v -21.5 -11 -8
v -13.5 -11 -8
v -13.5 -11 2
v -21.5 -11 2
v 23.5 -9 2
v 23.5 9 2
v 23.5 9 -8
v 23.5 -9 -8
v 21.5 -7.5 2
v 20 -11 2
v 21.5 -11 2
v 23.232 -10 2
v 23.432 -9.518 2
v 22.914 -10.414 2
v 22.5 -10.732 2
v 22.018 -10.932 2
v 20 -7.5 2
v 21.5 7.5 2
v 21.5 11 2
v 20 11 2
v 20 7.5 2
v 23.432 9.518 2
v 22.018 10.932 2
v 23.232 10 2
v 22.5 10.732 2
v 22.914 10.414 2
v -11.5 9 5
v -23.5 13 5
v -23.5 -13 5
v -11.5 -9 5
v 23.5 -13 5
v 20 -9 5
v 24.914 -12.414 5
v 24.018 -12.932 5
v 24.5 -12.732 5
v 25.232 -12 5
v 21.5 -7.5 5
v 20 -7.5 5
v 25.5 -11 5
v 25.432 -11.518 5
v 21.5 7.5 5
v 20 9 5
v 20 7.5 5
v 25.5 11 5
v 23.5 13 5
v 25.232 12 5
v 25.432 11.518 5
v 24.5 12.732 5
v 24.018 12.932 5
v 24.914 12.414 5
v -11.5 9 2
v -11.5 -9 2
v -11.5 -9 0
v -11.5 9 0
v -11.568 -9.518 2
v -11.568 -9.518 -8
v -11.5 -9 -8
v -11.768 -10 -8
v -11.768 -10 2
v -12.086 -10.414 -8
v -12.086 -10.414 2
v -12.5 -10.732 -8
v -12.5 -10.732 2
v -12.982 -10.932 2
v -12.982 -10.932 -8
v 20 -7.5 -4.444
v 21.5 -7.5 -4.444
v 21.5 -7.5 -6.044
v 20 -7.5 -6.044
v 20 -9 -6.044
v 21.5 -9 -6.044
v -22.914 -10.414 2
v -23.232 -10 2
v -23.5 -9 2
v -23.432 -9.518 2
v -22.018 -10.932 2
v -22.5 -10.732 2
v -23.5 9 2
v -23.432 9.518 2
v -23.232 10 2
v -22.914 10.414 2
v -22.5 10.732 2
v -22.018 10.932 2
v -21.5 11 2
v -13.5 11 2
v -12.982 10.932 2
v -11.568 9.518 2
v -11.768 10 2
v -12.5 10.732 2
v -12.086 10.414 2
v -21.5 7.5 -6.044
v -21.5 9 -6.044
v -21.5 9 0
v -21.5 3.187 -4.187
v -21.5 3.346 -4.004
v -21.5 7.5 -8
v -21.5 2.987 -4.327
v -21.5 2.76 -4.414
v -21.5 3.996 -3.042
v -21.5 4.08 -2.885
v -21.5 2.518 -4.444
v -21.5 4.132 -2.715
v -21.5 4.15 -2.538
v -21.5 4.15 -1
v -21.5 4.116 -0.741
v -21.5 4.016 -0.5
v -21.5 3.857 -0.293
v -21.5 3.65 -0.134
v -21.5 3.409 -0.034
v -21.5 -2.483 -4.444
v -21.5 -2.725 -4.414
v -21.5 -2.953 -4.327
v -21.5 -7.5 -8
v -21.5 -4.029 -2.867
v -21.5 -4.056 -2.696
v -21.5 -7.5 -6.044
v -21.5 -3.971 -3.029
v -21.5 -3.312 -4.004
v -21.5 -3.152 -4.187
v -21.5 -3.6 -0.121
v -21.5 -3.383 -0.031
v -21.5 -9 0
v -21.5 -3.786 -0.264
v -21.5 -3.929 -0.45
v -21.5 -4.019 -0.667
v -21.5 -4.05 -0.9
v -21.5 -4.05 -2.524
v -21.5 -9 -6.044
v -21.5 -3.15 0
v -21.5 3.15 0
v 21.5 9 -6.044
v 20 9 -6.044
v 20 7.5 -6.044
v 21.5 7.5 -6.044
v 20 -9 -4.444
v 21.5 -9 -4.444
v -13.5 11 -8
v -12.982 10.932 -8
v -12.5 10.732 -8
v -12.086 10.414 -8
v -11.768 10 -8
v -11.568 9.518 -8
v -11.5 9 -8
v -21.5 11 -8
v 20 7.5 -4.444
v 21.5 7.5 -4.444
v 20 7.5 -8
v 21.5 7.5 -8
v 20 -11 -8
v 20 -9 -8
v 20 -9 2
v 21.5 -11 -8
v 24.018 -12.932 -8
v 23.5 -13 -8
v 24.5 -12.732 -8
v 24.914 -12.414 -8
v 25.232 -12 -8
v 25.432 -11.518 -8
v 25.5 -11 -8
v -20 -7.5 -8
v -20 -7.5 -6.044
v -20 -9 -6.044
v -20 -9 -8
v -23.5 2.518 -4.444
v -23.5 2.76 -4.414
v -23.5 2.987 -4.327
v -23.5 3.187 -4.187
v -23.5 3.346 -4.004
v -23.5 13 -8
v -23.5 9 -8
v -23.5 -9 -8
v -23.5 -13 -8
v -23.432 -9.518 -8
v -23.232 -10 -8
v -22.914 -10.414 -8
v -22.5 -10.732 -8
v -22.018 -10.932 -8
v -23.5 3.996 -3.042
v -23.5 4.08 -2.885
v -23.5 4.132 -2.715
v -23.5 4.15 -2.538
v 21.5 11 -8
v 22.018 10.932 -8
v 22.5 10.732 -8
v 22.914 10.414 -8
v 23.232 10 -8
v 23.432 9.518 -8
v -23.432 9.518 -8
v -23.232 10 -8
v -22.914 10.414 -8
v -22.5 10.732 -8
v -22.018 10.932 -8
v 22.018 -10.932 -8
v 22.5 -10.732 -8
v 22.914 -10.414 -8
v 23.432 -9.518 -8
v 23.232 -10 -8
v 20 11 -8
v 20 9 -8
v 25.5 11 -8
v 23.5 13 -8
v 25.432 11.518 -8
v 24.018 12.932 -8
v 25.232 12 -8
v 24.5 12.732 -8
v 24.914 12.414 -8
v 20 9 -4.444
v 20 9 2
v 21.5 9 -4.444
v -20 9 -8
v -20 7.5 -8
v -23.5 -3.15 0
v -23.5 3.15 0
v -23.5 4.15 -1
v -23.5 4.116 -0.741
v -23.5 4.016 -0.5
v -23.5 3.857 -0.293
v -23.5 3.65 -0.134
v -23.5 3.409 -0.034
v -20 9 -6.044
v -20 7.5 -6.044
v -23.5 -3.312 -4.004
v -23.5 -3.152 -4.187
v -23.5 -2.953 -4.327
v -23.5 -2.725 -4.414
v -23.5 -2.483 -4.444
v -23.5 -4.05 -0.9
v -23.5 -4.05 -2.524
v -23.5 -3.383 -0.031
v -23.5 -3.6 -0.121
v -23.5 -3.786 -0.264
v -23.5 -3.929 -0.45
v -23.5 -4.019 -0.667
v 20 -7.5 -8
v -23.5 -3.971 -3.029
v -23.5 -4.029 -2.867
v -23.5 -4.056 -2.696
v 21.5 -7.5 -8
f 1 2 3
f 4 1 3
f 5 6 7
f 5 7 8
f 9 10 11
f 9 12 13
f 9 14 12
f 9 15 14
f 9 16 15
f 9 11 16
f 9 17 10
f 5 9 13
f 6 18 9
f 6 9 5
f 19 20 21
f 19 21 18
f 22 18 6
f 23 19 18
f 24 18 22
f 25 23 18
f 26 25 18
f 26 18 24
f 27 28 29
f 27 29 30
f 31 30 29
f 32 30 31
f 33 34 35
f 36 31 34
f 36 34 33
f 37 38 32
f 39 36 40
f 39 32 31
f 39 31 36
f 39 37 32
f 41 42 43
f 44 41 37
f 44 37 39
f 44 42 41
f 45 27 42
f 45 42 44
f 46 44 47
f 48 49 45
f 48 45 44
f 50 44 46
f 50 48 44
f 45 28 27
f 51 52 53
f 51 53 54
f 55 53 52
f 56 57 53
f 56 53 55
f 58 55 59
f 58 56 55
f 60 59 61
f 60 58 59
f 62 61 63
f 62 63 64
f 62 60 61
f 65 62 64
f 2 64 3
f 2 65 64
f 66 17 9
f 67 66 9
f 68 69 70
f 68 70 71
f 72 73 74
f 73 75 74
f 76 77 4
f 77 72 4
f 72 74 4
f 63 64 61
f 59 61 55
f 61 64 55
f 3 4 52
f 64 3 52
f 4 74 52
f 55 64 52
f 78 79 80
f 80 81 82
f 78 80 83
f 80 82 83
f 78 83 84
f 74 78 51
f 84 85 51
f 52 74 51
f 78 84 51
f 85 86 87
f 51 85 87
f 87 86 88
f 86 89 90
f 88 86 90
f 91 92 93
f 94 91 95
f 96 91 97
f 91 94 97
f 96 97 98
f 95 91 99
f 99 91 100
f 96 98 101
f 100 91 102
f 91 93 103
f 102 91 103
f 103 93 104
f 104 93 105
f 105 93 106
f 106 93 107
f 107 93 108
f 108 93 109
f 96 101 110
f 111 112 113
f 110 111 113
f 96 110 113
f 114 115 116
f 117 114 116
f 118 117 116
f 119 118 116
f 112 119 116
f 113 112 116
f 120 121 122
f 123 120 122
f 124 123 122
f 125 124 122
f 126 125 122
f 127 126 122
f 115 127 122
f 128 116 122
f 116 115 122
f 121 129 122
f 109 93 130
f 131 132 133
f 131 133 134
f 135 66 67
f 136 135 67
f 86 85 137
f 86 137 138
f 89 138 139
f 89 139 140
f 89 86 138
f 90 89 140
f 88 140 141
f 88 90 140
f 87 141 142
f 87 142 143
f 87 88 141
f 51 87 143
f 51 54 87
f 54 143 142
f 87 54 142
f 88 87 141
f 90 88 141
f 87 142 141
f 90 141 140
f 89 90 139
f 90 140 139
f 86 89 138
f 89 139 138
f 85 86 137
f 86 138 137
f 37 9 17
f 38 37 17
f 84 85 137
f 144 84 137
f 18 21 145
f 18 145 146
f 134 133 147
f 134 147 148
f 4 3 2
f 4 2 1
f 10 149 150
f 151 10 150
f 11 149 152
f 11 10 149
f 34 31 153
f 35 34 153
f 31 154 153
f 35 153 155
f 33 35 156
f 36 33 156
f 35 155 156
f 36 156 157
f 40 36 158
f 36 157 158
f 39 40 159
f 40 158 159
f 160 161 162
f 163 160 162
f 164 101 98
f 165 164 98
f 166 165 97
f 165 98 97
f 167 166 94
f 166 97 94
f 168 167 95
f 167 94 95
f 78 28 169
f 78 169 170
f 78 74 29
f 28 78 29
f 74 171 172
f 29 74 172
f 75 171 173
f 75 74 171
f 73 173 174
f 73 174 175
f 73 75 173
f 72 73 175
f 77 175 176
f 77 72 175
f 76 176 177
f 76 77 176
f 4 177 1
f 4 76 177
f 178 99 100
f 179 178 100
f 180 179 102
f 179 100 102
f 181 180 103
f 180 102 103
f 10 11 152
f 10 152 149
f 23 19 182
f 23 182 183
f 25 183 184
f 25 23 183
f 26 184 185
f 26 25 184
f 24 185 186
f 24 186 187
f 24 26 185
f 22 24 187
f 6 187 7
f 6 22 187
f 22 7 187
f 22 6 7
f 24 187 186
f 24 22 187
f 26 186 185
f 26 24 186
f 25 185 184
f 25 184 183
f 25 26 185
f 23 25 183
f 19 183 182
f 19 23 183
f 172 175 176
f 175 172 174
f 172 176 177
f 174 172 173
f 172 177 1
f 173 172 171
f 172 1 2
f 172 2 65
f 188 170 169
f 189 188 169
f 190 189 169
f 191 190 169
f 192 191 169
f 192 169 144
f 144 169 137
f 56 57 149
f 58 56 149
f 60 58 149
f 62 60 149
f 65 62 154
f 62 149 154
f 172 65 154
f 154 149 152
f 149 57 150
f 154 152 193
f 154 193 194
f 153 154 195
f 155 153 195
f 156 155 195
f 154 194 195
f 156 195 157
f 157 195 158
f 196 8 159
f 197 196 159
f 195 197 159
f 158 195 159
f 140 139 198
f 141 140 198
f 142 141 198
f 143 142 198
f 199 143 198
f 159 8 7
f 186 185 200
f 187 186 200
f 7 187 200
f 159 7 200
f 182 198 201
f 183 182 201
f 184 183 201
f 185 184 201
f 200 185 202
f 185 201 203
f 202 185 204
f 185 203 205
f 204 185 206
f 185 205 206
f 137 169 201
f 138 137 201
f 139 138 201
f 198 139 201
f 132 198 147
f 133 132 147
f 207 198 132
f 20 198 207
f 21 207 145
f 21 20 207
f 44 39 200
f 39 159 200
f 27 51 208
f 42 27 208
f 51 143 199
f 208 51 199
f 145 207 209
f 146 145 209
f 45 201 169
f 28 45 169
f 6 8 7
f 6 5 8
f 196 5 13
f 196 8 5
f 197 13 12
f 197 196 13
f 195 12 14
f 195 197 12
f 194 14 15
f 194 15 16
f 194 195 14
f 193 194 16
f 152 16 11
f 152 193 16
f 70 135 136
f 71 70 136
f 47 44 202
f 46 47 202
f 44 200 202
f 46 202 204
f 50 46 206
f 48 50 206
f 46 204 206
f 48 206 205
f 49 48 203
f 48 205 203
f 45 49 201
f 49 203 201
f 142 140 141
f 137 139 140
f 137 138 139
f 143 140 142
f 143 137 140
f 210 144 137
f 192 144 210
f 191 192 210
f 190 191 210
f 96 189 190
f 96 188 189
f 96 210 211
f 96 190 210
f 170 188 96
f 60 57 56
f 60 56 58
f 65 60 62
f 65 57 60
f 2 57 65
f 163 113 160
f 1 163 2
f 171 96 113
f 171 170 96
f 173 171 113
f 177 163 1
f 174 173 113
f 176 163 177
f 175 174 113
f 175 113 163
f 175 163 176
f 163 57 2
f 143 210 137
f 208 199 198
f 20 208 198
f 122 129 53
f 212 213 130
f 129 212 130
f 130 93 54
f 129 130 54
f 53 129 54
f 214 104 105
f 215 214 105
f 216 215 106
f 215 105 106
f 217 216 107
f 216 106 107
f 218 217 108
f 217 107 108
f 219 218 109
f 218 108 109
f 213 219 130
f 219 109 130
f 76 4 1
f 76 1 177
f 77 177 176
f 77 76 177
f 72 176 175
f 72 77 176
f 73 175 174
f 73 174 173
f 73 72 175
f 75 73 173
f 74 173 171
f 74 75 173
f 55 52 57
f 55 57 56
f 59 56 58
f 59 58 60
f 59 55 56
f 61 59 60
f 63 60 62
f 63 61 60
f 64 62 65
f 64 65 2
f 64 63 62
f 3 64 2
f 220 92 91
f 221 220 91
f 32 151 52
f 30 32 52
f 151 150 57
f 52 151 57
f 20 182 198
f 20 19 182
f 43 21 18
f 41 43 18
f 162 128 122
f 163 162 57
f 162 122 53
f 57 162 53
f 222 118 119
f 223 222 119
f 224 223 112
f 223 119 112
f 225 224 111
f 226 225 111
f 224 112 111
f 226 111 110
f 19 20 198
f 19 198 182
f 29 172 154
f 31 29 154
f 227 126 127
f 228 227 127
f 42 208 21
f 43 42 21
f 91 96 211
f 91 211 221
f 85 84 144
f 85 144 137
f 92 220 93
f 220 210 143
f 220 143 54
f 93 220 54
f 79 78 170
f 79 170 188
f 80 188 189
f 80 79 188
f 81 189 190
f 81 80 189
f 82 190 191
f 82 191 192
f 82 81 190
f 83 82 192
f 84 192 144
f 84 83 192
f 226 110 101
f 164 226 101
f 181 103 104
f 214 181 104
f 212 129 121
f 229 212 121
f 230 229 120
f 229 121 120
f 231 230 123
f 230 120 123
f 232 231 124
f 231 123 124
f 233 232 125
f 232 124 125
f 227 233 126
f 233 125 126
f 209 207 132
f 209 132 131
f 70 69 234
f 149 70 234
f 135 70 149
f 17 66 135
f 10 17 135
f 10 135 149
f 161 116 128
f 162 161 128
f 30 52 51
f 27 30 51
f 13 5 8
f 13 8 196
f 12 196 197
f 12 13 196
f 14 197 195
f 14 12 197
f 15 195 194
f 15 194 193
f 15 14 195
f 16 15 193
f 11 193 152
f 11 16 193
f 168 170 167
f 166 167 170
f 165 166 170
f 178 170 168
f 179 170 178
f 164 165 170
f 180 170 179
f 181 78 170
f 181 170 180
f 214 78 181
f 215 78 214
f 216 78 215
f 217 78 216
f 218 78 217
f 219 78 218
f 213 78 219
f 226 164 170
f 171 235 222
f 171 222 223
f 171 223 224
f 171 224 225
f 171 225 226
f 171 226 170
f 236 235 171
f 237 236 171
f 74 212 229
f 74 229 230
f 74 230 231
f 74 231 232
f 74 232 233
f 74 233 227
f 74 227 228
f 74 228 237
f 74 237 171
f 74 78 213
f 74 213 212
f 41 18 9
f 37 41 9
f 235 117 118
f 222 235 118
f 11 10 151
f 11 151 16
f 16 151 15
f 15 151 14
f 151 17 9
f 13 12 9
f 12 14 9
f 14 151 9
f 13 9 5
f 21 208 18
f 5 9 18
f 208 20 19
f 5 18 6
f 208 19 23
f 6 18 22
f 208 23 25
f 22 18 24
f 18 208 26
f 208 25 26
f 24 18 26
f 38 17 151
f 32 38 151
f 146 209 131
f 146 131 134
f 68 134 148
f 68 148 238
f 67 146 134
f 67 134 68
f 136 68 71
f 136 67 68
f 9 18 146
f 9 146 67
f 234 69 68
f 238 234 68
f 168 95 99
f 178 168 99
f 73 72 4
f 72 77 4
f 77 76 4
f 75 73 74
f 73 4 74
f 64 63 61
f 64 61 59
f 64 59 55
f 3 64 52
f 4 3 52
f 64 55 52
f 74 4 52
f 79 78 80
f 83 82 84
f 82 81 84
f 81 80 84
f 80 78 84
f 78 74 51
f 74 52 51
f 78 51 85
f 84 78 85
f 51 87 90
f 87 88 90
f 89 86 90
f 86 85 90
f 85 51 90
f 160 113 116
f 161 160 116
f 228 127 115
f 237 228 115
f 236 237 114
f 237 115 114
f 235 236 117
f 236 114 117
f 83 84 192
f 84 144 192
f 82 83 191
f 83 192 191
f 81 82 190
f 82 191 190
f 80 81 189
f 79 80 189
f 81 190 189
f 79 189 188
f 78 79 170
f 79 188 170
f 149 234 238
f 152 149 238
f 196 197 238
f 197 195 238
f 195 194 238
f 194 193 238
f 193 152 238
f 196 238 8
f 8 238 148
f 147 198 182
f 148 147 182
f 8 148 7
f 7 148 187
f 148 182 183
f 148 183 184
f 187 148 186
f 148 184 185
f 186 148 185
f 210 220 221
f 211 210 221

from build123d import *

# Parameters (mm, degrees)
F0_W          = 10
F0_H          = 2
F0_H_2        = 18
F1_DEPTH      = 2
F0_W_2        = 1.5
F0_H_3        = 1.5
F2_DEPTH      = 8
F3_W          = 15
F3_H          = 1.9559594506
F4_DEPTH      = 2
F3_W_2        = 1.5
F5_DEPTH      = 2
F5_DEPTH_BACK = 1.5
F6_DEPTH      = 8
F7_START      = -4.4440405494
F7_DEPTH      = 1.6
F8_R          = 2
F8_2_R        = 2
F10_DEPTH     = 10
F11_DEPTH     = 3


with BuildPart() as f1:
    # F0 (on Top) → F1 (new body)
    with BuildSketch(Plane.XY):
        with Locations((-16.5, 10)):
            Rectangle(F0_W, F0_H)
        with Locations((-16.5, -10)):
            Rectangle(F0_W, F0_H)
        with Locations((-16.5, 0)):
            Rectangle(F0_W, F0_H_2)
    extrude(amount=F1_DEPTH)

    # F0 (on Top) → F2 (join)
    with BuildSketch(Plane.XY):
        with Locations((-16.5, 10)):
            Rectangle(F0_W, F0_H)
        with Locations((-16.5, -10)):
            Rectangle(F0_W, F0_H)
    extrude(amount=-F2_DEPTH)

    # F3 (on face) → F4 (join)
    with BuildSketch(Plane(origin=(-21.5, 0, 0), x_dir=(0, -1, 0), z_dir=(-1, 0, 0))):
        with BuildLine():
            Line((-9, 0), (-9, -6.0440405494))
            Line((-9, -6.0440405494), (-7.5, -6.0440405494))
            Line((-7.5, -6.0440405494), (7.5, -6.0440405494))
            Line((7.5, -6.0440405494), (9, -6.0440405494))
            Line((9, -6.0440405494), (9, 0))
            Line((9, 0), (3.15, 0))
            ThreePointArc((3.15, 0), (3.7863961031, -0.2636038969), (4.05, -0.9))
            Line((4.05, -0.9), (4.05, -2.5242070224))
            ThreePointArc((4.05, -2.5242070224), (4.0468138033, -2.7821445636), (3.9705917564, -3.0285834538))
            Line((3.9705917564, -3.0285834538), (3.312223581, -4.0036350553))
            ThreePointArc((3.312223581, -4.0036350553), (2.9527146896, -4.3271018457), (2.4834570343, -4.4440405494))
            Line((2.4834570343, -4.4440405494), (-2.517703725, -4.4440405494))
            ThreePointArc((-2.517703725, -4.4440405494), (-2.9869613803, -4.3271018457), (-3.3464702717, -4.0036350553))
            Line((-3.3464702717, -4.0036350553), (-3.995889892, -3.0418363771))
            ThreePointArc((-3.995889892, -3.0418363771), (-4.1106105109, -2.8015443463), (-4.15, -2.5382013218))
            Line((-4.15, -2.5382013218), (-4.15, -1))
            ThreePointArc((-4.15, -1), (-3.8571067812, -0.2928932188), (-3.15, 0))
            Line((-3.15, 0), (-9, 0))
        make_face()
        Polygon((-9, -8), (-9, -6.0440405494), (-9, 0), (-3.15, 0), (3.15, 0), (9, 0), (9, -6.0440405494), (9, -8), (11, -8), (11, 2), (-11, 2), (-11, -8), align=None)
        with Locations((0, -7.0220202747)):
            Rectangle(F3_W, F3_H)
    extrude(amount=F4_DEPTH)

    # F3 (on face) → F5 (join, two sides)
    with BuildSketch(Plane(origin=(-21.5, 0, 0), x_dir=(0, -1, 0), z_dir=(-1, 0, 0))) as f5_sk:
        with Locations((8.25, -7.0220202747)):
            Rectangle(F3_W_2, F3_H)
        with Locations((-8.25, -7.0220202747)):
            Rectangle(F3_W_2, F3_H)
    extrude(amount=F5_DEPTH)
    extrude(f5_sk.sketch, amount=-F5_DEPTH_BACK)

    # F8
    f8_edges = [f1.edges().sort_by_distance(p)[0] for p in [
        (-23.5, 11, -3),
        (-23.5, -11, -3),
        (-11.5, 11, -3),
        (-11.5, -11, -3),
    ]]
    fillet(f8_edges, radius=F8_R)


with BuildPart() as f1b:
    # F0 (on Top) → F1, piece 2 (new body)
    with BuildSketch(Plane.XY):
        with Locations((20.75, -10)):
            Rectangle(F0_W_2, F0_H)
        with Locations((20.75, 8.25)):
            Rectangle(F0_W_2, F0_H_3)
        with Locations((20.75, -8.25)):
            Rectangle(F0_W_2, F0_H_3)
        Polygon((21.5, -7.5), (21.5, -9), (21.5, -11), (23.5, -11), (23.5, 11), (21.5, 11), (21.5, 9), (21.5, 7.5), align=None)
        with Locations((20.75, 10)):
            Rectangle(F0_W_2, F0_H)
    extrude(amount=F1_DEPTH)

    # F0 (on Top) → F6 (join, through all)
    with BuildSketch(Plane.XY):
        Polygon((21.5, -7.5), (21.5, -9), (21.5, -11), (23.5, -11), (23.5, 11), (21.5, 11), (21.5, 9), (21.5, 7.5), align=None)
        with Locations((20.75, -10)):
            Rectangle(F0_W_2, F0_H)
        with Locations((20.75, 10)):
            Rectangle(F0_W_2, F0_H)
        with Locations((20.75, -8.25)):
            Rectangle(F0_W_2, F0_H_3)
        with Locations((20.75, 8.25)):
            Rectangle(F0_W_2, F0_H_3)
    extrude(amount=-F6_DEPTH)

    # F0 (on Top) → F7 (cut)
    with BuildSketch(Plane.XY.offset(F7_START)):
        with Locations((20.75, -8.25)):
            Rectangle(F0_W_2, F0_H_3)
        with Locations((20.75, 8.25)):
            Rectangle(F0_W_2, F0_H_3)
    extrude(amount=-F7_DEPTH, mode=Mode.SUBTRACT)

    # F8#2
    f8_2_edges = [f1b.edges().sort_by_distance(p)[0] for p in [
        (23.5, 11, -3),
        (23.5, -11, -3),
    ]]
    fillet(f8_2_edges, radius=F8_2_R)


with BuildPart() as f10:
    # F9 (on face) → F10 (new body, through all)
    with BuildSketch(Plane.XY.offset(2)):
        with BuildLine():
            ThreePointArc((-21.5, -11), (-22.9142135624, -10.4142135624), (-23.5, -9))
            Line((-23.5, -9), (-23.5, -13))
            Line((-23.5, -13), (23.5, -13))
            ThreePointArc((23.5, -13), (24.9142135624, -12.4142135624), (25.5, -11))
            Line((25.5, -11), (25.5, 0))
            Line((25.5, 0), (25.5, 11))
            ThreePointArc((25.5, 11), (24.9142135624, 12.4142135624), (23.5, 13))
            Line((23.5, 13), (-23.5, 13))
            Line((-23.5, 13), (-23.5, 9))
            ThreePointArc((-23.5, 9), (-22.9142135624, 10.4142135624), (-21.5, 11))
            Line((-21.5, 11), (-13.5, 11))
            Line((-13.5, 11), (20, 11))
            Line((20, 11), (21.5, 11))
            ThreePointArc((21.5, 11), (22.9142135624, 10.4142135624), (23.5, 9))
            Line((23.5, 9), (23.5, 0))
            Line((23.5, 0), (23.5, -9))
            ThreePointArc((23.5, -9), (22.9142135624, -10.4142135624), (21.5, -11))
            Line((21.5, -11), (20, -11))
            Line((20, -11), (-13.5, -11))
            Line((-13.5, -11), (-21.5, -11))
        make_face()
        with BuildLine():
            ThreePointArc((-11.5, -9), (-12.0857864376, -10.4142135624), (-13.5, -11))
            Line((-13.5, -11), (20, -11))
            Line((20, -11), (20, -9))
            Line((20, -9), (-11.5, -9))
        make_face()
        with BuildLine():
            Line((20, 11), (-13.5, 11))
            ThreePointArc((-13.5, 11), (-12.0857864376, 10.4142135624), (-11.5, 9))
            Line((-11.5, 9), (20, 9))
            Line((20, 9), (20, 11))
        make_face()
    extrude(amount=-F10_DEPTH)

    # F9 (on face) → F11 (join)
    with BuildSketch(Plane.XY.offset(2)):
        with BuildLine():
            ThreePointArc((-21.5, -11), (-22.9142135624, -10.4142135624), (-23.5, -9))
            Line((-23.5, -9), (-23.5, -13))
            Line((-23.5, -13), (23.5, -13))
            ThreePointArc((23.5, -13), (24.9142135624, -12.4142135624), (25.5, -11))
            Line((25.5, -11), (25.5, 0))
            Line((25.5, 0), (25.5, 11))
            ThreePointArc((25.5, 11), (24.9142135624, 12.4142135624), (23.5, 13))
            Line((23.5, 13), (-23.5, 13))
            Line((-23.5, 13), (-23.5, 9))
            ThreePointArc((-23.5, 9), (-22.9142135624, 10.4142135624), (-21.5, 11))
            Line((-21.5, 11), (-13.5, 11))
            Line((-13.5, 11), (20, 11))
            Line((20, 11), (21.5, 11))
            ThreePointArc((21.5, 11), (22.9142135624, 10.4142135624), (23.5, 9))
            Line((23.5, 9), (23.5, 0))
            Line((23.5, 0), (23.5, -9))
            ThreePointArc((23.5, -9), (22.9142135624, -10.4142135624), (21.5, -11))
            Line((21.5, -11), (20, -11))
            Line((20, -11), (-13.5, -11))
            Line((-13.5, -11), (-21.5, -11))
        make_face()
        with BuildLine():
            Line((20, -9), (20, -11))
            Line((20, -11), (21.5, -11))
            ThreePointArc((21.5, -11), (22.9142135624, -10.4142135624), (23.5, -9))
            Line((23.5, -9), (23.5, 0))
            Line((23.5, 0), (23.5, 9))
            ThreePointArc((23.5, 9), (22.9142135624, 10.4142135624), (21.5, 11))
            Line((21.5, 11), (20, 11))
            Line((20, 11), (20, 9))
            Line((20, 9), (20, 7.5))
            Line((20, 7.5), (21.5, 7.5))
            Line((21.5, 7.5), (21.5, -7.5))
            Line((21.5, -7.5), (20, -7.5))
            Line((20, -7.5), (20, -9))
        make_face()
        with BuildLine():
            Line((-23.5, 9), (-23.5, -9))
            ThreePointArc((-23.5, -9), (-22.9142135624, -10.4142135624), (-21.5, -11))
            Line((-21.5, -11), (-13.5, -11))
            ThreePointArc((-13.5, -11), (-12.0857864376, -10.4142135624), (-11.5, -9))
            Line((-11.5, -9), (-11.5, 9))
            ThreePointArc((-11.5, 9), (-12.0857864376, 10.4142135624), (-13.5, 11))
            Line((-13.5, 11), (-21.5, 11))
            ThreePointArc((-21.5, 11), (-22.9142135624, 10.4142135624), (-23.5, 9))
        make_face()
        with BuildLine():
            Line((20, 11), (-13.5, 11))
            ThreePointArc((-13.5, 11), (-12.0857864376, 10.4142135624), (-11.5, 9))
            Line((-11.5, 9), (20, 9))
            Line((20, 9), (20, 11))
        make_face()
        with BuildLine():
            ThreePointArc((-11.5, -9), (-12.0857864376, -10.4142135624), (-13.5, -11))
            Line((-13.5, -11), (20, -11))
            Line((20, -11), (20, -9))
            Line((20, -9), (-11.5, -9))
        make_face()
    extrude(amount=F11_DEPTH)


solid = Compound([f1.part, f1b.part, f10.part])
